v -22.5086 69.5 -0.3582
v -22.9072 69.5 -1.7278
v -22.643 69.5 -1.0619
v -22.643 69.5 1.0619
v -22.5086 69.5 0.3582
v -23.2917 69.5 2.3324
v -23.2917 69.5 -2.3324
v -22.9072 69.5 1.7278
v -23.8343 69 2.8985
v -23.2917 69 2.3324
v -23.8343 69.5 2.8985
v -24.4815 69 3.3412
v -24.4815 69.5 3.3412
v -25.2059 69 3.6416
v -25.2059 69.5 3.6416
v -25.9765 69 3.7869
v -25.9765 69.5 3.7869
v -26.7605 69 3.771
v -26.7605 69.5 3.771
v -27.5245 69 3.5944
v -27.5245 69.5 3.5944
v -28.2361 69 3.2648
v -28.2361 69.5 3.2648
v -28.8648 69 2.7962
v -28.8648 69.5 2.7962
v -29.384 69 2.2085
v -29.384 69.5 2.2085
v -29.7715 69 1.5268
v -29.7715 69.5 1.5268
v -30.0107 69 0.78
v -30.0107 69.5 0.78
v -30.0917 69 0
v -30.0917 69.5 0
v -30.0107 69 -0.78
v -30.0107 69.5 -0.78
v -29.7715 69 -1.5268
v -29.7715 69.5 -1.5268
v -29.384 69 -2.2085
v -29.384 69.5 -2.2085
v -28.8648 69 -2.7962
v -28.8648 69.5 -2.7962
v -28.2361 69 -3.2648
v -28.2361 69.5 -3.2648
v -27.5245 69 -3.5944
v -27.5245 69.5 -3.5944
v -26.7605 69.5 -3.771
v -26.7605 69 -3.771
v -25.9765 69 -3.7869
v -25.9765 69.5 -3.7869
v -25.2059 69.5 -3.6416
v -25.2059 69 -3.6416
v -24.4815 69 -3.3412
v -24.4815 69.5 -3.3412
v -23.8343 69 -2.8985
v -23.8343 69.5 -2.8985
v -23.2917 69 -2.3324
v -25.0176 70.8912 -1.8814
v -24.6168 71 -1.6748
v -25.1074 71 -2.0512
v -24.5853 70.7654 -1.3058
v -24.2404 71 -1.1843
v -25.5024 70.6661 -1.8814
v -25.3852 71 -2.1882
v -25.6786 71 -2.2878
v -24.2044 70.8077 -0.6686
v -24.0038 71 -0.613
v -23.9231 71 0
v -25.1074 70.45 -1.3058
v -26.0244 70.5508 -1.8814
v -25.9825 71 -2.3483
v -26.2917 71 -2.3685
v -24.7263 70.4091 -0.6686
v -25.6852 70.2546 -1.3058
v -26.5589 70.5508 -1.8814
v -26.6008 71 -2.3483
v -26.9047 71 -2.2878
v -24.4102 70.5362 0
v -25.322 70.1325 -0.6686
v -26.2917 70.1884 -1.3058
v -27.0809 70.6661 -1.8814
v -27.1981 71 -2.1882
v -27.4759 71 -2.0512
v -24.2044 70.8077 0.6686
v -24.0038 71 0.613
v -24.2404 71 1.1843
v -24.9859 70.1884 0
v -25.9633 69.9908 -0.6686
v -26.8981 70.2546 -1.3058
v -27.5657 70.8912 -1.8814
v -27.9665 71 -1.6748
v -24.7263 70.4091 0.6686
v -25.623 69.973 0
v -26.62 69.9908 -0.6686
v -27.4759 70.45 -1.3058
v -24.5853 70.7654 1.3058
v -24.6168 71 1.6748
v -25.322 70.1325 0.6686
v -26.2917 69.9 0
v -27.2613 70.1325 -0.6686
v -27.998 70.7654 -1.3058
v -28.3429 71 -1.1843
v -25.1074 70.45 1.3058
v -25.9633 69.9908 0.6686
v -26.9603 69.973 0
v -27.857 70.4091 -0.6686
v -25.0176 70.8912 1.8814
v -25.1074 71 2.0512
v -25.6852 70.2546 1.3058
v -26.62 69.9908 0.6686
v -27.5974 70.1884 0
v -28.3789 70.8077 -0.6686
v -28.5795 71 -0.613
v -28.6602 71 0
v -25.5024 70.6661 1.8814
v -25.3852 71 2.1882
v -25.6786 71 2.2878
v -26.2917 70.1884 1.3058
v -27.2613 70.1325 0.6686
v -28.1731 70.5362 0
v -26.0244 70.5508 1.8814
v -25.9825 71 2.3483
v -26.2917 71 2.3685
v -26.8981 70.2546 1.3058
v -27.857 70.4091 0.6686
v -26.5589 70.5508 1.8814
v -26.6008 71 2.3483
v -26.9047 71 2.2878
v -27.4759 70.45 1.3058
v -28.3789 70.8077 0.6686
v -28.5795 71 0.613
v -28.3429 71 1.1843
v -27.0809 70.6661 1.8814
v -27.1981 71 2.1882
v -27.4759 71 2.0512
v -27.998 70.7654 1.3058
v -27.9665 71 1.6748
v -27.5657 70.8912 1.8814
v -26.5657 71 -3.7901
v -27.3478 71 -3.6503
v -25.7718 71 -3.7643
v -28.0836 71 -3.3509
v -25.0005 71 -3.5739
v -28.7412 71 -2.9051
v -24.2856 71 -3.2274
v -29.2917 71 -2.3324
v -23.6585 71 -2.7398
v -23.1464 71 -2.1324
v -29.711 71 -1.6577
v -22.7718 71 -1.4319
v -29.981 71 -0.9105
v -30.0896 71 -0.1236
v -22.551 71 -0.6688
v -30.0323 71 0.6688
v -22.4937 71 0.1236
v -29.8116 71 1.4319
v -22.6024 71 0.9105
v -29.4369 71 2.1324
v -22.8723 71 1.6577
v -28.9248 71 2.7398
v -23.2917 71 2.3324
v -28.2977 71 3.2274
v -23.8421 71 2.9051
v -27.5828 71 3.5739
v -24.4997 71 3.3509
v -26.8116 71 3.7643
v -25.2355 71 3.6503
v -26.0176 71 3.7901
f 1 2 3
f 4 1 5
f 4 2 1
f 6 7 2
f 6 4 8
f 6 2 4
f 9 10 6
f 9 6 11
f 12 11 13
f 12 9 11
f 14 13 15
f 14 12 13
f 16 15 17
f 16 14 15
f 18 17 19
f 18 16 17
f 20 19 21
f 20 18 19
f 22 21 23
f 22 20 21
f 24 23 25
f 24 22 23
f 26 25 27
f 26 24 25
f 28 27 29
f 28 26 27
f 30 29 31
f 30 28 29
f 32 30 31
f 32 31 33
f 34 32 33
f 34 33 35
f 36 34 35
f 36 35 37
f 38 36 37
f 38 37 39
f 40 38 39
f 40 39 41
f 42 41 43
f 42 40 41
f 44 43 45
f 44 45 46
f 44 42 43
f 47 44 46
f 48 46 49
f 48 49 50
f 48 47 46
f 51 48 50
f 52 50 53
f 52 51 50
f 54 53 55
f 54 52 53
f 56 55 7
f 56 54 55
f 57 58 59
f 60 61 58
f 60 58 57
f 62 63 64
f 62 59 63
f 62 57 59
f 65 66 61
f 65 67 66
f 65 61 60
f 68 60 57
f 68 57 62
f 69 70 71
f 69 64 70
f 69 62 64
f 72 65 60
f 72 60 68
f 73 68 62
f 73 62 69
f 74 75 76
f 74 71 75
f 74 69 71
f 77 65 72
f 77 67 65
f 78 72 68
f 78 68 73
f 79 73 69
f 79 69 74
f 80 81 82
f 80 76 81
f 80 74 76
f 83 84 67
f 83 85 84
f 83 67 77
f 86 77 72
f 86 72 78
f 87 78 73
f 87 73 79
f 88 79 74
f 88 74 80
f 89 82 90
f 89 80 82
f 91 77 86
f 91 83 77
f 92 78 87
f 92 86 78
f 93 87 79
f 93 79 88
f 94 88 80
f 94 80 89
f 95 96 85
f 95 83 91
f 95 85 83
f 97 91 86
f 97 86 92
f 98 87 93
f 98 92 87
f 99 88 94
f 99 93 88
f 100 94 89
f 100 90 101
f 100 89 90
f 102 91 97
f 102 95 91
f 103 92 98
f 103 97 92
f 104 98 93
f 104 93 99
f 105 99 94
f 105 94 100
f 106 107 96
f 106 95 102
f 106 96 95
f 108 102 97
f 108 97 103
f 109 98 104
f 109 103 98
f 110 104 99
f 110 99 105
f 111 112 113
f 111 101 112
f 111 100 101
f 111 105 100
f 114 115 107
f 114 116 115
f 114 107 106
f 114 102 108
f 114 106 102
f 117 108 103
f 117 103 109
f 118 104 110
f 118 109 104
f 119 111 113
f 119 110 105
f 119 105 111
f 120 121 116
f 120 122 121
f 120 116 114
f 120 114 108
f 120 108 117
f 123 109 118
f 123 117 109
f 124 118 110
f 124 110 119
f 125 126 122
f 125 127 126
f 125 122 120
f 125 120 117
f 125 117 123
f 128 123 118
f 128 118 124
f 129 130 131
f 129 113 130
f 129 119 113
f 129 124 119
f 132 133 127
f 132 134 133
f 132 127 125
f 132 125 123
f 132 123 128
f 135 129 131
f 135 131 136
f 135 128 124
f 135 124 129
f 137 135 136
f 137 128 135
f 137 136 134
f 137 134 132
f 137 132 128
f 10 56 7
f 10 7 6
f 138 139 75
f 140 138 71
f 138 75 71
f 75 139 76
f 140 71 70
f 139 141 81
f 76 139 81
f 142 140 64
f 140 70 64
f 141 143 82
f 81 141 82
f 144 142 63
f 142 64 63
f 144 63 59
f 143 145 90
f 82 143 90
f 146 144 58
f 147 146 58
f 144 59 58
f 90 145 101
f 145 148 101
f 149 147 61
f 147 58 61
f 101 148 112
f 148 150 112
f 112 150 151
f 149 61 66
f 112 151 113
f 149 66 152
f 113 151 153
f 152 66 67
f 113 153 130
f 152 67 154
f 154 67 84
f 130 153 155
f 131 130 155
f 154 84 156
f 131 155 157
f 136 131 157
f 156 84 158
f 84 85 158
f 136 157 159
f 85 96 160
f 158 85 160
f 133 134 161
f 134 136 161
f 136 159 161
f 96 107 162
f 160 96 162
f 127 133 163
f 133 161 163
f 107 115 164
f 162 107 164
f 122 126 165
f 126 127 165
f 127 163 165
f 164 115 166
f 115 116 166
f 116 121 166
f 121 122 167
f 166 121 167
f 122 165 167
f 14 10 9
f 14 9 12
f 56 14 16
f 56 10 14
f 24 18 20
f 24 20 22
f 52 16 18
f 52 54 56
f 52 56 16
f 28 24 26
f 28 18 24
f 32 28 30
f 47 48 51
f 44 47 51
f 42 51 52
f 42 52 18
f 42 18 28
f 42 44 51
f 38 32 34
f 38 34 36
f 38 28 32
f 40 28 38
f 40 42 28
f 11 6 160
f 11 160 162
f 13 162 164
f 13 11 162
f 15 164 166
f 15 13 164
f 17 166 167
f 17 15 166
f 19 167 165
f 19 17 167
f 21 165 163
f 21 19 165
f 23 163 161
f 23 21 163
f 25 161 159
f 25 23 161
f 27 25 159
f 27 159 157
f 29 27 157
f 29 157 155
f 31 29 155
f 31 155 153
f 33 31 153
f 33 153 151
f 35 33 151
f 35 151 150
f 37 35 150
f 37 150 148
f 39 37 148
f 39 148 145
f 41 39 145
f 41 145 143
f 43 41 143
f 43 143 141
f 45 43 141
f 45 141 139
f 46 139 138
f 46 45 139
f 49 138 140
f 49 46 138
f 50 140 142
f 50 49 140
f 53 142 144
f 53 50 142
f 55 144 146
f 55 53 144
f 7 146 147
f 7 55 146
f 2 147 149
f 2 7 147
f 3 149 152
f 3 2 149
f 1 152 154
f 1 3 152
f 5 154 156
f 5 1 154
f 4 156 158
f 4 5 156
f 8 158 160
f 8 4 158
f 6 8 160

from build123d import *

# Parameters (mm, degrees)
KEYED_BACK_DEPTH   = 0.5
CUP_BLANK_SKETCH_R = 3.8
CUP_BLANK_DEPTH    = 1.5


with BuildPart() as part:
    # Keyed Back Sketch → Keyed Back (new body)
    with BuildSketch(Plane(origin=(0, -69, 0), x_dir=(-1, 0, 0), z_dir=(0, -1, 0))):
        with BuildLine():
            Line((23.291651246, 2.332380758), (23.291651246, -2.332380758))
            ThreePointArc((23.291651246, -2.332380758), (30.091651246, 0), (23.291651246, 2.332380758))
        make_face()
    extrude(amount=KEYED_BACK_DEPTH)

    # Cup Blank Sketch → Cup Blank (add)
    with BuildSketch(Plane(origin=(0, -69.5, 0), x_dir=(-1, 0, 0), z_dir=(0, -1, 0))):
        with Locations(Location((26.291651246, 0, 0), (0, 0, 217.863646362))):
            Circle(CUP_BLANK_SKETCH_R)
    extrude(amount=CUP_BLANK_DEPTH)

    # Spherical Bearing Seat profile → Spherical Bearing Seat (revolve, cut)
    with BuildSketch(Plane(origin=(0, -73, 0), x_dir=(-1, 0, 0), z_dir=(0, -1, 0))):
        with BuildLine():
            Line((26.291651246, -3.1), (26.291651246, 3.1))
            ThreePointArc((26.291651246, 3.1), (23.191651246, 0), (26.291651246, -3.1))
        make_face()
    revolve(axis=Axis((-26.291651246, -73, -10), (0, 0, 1)), mode=Mode.SUBTRACT)


with BuildPart() as body_2:
    # Mirror1: mirrored copy
    add(part.part.mirror(Plane(origin=(0, 0, 0), x_dir=(0, 0, 1), z_dir=(0, -1, 0))))


solid = body_2.part
